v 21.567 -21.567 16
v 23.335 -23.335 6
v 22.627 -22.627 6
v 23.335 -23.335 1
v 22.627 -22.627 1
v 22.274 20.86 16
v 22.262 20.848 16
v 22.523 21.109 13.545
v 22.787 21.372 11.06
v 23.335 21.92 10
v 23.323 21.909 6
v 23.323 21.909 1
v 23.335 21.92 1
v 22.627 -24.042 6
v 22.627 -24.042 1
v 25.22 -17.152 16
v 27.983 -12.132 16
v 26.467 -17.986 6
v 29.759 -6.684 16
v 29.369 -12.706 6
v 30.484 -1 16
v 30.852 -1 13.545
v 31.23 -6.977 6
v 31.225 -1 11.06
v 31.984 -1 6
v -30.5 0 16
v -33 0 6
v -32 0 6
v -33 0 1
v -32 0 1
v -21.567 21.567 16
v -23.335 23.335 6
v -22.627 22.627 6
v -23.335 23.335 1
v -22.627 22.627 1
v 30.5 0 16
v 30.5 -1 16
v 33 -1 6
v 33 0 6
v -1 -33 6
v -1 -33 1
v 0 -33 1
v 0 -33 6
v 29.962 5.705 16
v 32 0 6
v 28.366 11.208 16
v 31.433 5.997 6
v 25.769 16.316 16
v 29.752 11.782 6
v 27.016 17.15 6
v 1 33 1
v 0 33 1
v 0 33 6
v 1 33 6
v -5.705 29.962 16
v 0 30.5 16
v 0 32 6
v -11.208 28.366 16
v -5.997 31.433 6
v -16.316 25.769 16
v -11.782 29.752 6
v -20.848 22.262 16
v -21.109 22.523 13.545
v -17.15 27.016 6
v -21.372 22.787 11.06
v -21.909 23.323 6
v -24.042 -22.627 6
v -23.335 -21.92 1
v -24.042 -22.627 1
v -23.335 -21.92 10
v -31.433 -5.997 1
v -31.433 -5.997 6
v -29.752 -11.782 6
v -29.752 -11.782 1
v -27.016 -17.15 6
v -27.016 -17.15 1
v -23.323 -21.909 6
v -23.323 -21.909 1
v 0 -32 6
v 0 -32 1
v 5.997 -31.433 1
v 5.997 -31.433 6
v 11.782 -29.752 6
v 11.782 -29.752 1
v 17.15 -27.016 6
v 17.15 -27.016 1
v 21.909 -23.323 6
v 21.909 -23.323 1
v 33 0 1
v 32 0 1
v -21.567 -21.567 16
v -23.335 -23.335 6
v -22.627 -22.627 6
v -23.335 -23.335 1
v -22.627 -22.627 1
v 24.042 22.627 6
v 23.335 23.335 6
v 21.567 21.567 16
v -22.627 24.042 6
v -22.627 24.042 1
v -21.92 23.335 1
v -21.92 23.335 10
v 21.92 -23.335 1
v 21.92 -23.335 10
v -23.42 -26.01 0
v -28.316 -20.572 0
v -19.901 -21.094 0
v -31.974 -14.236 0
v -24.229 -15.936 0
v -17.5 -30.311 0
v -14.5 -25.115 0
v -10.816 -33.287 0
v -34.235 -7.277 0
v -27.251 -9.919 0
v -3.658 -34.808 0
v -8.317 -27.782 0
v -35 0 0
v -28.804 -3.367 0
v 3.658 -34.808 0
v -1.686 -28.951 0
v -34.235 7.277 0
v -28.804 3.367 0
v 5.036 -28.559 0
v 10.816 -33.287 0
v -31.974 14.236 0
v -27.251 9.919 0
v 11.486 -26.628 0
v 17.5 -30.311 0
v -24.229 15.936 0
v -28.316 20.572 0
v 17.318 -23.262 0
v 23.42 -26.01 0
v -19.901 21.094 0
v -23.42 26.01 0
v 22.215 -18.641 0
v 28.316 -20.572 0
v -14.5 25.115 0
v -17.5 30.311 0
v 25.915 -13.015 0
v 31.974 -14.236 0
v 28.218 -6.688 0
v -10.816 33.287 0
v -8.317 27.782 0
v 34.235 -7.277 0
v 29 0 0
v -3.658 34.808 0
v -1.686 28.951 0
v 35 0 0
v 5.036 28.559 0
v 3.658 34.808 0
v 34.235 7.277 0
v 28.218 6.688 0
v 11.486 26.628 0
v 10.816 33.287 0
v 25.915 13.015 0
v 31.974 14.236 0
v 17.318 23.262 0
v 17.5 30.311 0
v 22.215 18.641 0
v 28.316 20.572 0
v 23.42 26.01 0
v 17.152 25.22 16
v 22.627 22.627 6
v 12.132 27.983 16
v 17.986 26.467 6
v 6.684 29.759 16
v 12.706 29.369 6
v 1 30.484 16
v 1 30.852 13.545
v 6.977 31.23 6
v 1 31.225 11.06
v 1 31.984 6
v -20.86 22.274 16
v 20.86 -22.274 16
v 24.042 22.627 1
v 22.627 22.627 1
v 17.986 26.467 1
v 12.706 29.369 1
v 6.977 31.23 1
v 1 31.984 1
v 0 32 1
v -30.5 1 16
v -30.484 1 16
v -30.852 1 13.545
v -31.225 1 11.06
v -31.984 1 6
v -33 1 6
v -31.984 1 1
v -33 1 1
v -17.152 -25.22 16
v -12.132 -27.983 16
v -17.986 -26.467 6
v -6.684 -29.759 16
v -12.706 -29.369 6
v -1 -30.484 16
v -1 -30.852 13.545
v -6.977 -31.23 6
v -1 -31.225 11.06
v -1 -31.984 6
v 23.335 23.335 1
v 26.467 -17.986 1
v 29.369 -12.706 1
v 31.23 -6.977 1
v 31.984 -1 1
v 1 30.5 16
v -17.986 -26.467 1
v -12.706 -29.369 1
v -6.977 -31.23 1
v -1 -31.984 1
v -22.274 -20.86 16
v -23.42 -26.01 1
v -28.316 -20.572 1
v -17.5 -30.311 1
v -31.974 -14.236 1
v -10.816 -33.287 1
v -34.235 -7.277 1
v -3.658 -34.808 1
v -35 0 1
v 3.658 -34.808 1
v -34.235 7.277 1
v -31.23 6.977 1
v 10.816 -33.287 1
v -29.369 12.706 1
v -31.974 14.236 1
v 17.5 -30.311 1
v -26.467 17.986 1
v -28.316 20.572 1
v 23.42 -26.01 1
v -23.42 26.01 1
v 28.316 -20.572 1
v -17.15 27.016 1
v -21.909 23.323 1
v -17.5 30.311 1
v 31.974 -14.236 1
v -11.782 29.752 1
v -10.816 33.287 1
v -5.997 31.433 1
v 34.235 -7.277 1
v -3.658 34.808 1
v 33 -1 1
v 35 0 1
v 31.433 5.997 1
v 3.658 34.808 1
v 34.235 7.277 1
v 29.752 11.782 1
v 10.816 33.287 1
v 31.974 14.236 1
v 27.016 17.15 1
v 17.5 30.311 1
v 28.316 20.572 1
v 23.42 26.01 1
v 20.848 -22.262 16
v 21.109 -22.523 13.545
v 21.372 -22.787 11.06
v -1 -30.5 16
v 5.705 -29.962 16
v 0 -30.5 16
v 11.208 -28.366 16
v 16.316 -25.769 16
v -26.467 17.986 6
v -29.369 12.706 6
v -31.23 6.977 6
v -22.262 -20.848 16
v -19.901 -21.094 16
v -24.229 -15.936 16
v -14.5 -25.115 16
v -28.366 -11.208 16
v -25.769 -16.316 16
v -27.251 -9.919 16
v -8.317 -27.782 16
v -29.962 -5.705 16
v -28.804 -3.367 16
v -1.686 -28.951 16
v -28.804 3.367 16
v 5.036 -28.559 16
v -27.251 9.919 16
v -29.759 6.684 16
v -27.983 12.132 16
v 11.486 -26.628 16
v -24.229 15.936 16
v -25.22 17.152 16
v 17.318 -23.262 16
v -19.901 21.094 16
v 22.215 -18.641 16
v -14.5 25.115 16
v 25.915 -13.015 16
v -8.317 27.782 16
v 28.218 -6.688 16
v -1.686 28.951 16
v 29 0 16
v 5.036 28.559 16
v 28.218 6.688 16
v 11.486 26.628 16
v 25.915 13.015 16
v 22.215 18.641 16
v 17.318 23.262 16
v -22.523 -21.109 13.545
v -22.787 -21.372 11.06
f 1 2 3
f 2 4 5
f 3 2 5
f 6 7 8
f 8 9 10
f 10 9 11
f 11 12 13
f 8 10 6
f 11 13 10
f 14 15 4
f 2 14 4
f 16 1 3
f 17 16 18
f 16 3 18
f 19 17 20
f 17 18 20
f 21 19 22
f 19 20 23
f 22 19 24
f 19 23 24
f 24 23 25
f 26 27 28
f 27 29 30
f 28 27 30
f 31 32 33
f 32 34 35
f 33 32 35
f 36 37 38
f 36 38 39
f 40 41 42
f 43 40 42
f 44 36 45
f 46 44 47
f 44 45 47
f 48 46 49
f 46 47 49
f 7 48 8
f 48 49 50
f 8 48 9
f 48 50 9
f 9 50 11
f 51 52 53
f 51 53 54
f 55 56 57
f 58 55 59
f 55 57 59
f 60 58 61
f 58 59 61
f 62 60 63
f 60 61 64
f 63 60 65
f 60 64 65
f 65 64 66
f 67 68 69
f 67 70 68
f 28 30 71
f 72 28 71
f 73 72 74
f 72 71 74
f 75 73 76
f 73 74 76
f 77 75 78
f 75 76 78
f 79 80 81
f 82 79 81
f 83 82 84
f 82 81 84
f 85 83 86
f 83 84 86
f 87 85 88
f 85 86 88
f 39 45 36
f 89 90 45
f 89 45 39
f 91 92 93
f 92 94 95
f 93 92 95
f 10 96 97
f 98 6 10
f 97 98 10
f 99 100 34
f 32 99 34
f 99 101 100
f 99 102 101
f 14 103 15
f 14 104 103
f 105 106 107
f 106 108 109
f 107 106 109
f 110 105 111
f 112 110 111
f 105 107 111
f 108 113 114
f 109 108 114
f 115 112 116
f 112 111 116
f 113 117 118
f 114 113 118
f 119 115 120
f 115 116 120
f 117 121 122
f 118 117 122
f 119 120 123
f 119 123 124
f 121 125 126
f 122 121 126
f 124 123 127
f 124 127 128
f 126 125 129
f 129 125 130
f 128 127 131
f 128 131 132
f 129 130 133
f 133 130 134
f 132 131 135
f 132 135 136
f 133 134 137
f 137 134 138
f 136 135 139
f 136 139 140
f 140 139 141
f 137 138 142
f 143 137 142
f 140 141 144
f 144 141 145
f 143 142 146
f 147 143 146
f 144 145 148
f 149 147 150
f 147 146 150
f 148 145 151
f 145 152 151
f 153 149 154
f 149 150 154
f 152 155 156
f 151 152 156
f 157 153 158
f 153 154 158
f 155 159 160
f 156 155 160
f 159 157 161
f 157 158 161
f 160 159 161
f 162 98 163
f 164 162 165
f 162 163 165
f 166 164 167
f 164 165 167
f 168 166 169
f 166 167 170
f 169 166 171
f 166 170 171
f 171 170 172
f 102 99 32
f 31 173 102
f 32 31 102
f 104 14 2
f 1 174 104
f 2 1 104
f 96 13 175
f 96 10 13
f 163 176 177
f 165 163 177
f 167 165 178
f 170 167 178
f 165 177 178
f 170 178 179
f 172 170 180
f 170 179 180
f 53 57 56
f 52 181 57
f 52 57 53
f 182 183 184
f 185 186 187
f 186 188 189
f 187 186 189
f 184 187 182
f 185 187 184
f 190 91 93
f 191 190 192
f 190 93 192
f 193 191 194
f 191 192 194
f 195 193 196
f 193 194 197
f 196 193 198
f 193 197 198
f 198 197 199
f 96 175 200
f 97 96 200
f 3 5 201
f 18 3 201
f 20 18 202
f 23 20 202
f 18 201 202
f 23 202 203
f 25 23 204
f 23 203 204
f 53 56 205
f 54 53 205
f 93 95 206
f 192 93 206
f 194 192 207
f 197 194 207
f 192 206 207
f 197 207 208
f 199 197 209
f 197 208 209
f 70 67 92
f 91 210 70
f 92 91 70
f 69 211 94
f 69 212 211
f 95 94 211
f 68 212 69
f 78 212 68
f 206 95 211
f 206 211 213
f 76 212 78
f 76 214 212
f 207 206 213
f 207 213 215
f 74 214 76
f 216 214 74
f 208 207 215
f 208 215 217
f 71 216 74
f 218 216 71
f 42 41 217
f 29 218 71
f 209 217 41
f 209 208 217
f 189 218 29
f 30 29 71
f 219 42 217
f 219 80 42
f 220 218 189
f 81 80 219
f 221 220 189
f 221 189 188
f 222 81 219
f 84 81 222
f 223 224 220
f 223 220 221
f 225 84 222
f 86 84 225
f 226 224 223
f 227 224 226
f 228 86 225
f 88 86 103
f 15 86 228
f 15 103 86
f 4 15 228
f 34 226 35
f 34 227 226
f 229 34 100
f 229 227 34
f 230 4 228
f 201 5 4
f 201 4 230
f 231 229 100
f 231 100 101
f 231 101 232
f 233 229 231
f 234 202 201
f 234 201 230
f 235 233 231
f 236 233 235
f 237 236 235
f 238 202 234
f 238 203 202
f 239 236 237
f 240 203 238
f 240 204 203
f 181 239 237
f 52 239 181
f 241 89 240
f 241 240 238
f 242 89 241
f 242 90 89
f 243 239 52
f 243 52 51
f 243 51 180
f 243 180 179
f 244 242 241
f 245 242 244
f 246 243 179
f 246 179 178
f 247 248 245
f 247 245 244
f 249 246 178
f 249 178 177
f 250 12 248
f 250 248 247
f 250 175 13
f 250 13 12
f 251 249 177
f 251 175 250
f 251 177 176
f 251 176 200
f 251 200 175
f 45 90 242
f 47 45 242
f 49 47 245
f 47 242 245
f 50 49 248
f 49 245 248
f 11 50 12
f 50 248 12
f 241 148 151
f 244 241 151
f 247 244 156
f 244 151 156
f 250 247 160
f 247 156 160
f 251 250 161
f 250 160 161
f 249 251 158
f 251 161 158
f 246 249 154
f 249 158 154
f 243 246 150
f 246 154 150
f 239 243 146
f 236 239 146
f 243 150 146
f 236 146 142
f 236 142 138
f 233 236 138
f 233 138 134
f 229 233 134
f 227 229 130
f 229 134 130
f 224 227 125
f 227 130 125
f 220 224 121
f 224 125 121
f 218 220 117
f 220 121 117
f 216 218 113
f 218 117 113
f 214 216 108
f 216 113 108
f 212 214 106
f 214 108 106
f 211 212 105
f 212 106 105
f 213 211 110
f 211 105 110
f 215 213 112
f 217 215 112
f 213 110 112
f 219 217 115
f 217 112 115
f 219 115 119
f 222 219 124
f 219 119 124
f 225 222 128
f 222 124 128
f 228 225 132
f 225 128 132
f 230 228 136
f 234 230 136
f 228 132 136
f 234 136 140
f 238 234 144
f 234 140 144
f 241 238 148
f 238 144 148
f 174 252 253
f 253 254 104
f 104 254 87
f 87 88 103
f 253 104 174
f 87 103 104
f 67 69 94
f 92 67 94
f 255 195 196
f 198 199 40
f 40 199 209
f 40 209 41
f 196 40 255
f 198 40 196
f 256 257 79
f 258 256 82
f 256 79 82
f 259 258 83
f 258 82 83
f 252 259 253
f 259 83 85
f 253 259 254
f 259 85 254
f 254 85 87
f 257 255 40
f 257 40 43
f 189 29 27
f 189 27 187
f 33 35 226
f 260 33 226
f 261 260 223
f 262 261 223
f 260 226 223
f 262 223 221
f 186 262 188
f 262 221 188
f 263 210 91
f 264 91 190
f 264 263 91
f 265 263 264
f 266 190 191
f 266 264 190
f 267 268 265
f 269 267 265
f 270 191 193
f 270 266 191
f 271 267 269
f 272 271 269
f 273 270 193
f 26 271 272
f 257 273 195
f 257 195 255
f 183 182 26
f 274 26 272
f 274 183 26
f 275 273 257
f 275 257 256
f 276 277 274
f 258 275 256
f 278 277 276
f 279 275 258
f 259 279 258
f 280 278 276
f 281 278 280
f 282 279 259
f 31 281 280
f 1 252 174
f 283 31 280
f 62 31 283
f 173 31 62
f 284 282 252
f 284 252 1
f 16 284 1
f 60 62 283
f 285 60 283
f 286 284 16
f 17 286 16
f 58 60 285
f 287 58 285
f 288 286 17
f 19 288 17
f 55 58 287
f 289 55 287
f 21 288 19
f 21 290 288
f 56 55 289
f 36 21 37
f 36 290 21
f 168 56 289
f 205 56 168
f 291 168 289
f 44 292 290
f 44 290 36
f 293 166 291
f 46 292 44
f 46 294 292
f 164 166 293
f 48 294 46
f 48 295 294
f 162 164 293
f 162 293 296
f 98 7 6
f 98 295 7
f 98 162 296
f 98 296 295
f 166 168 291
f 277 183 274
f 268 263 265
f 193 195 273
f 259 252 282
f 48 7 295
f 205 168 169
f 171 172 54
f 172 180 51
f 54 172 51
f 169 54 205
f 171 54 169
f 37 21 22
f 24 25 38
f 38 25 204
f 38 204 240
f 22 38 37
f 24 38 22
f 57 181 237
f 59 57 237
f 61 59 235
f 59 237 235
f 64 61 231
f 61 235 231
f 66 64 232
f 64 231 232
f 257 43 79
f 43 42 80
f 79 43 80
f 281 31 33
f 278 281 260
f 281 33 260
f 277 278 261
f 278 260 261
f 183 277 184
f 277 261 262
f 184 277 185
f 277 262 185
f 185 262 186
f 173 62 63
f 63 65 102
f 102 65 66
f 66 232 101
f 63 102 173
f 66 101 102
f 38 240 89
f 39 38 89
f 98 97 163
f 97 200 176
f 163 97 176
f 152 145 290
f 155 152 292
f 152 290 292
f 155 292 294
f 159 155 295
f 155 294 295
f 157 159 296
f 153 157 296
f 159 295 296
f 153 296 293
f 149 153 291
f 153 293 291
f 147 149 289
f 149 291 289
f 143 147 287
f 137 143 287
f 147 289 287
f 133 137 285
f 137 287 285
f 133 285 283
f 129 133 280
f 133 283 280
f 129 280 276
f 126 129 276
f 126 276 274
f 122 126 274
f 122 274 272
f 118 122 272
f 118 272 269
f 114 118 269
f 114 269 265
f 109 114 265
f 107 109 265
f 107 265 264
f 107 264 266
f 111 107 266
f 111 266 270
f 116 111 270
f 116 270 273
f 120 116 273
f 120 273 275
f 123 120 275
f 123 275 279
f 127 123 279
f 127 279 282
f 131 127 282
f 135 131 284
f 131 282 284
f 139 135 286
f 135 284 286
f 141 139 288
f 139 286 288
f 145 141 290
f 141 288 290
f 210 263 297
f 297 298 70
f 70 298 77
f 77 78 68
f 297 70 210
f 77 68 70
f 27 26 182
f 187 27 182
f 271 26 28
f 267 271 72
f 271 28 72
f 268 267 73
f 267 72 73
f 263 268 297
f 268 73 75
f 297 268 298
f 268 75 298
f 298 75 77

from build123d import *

# Parameters (mm, degrees)
F0_R       = 35
F1_DEPTH   = 1
F2_W       = 1
F2_H       = 1
F3_DEPTH   = 15
F4_R       = 29
F5_DEPTH   = 16.001
F6_SIZE2   = 10
F6_SIZE    = 1.5
F7_SIZE2   = 2.5
F7_SIZE    = 10
F7_2_SIZE2 = 2.5
F7_2_SIZE  = 10
F7_3_SIZE2 = 2.5
F7_3_SIZE  = 10
F7_4_SIZE2 = 2.5
F7_4_SIZE  = 10
F7_5_SIZE2 = 2.5
F7_5_SIZE  = 10
F7_6_SIZE2 = 2.5
F7_6_SIZE  = 10
F7_7_SIZE2 = 2.5
F7_7_SIZE  = 10
F7_8_SIZE2 = 2.5
F7_8_SIZE  = 10


with BuildPart() as f1:
    # F0 (on Top) → F1 (new body)
    with BuildSketch(Plane.XY):
        Circle(F0_R)
    extrude(amount=F1_DEPTH)

    # F2 (on face) → F3 (join)
    with BuildSketch(Plane.XY.offset(1)):
        with BuildLine():
            Line((31, 0), (32, 0))
            ThreePointArc((32, 0), (29.7519001173, 11.7823783426), (23.323472537, 21.9092589746))
            Line((23.323472537, 21.9092589746), (22.627416998, 21.2132034356))
            Line((22.627416998, 21.2132034356), (21.9203102168, 21.9203102168))
            Line((21.9203102168, 21.9203102168), (22.627416998, 22.627416998))
            ThreePointArc((22.627416998, 22.627416998), (12.7063707016, 29.3691699507), (1, 31.9843711834))
            Line((1, 31.9843711834), (1, 31))
            Line((1, 31), (0, 31))
            Line((0, 31), (0, 32))
            ThreePointArc((0, 32), (-11.7823783426, 29.7519001173), (-21.9092589746, 23.323472537))
            Line((-21.9092589746, 23.323472537), (-21.2132034356, 22.627416998))
            Line((-21.2132034356, 22.627416998), (-21.9203102168, 21.9203102168))
            Line((-21.9203102168, 21.9203102168), (-22.627416998, 22.627416998))
            ThreePointArc((-22.627416998, 22.627416998), (-29.3691699507, 12.7063707016), (-31.9843711834, 1))
            Line((-31.9843711834, 1), (-31, 1))
            Line((-31, 1), (-31, 0))
            Line((-31, 0), (-32, 0))
            ThreePointArc((-32, 0), (-29.7519001173, -11.7823783426), (-23.323472537, -21.9092589746))
            Line((-23.323472537, -21.9092589746), (-22.627416998, -21.2132034356))
            Line((-22.627416998, -21.2132034356), (-21.9203102168, -21.9203102168))
            Line((-21.9203102168, -21.9203102168), (-22.627416998, -22.627416998))
            ThreePointArc((-22.627416998, -22.627416998), (-12.7063707016, -29.3691699507), (-1, -31.9843711834))
            Line((-1, -31.9843711834), (-1, -31))
            Line((-1, -31), (0, -31))
            Line((0, -31), (0, -32))
            ThreePointArc((0, -32), (11.7823783426, -29.7519001173), (21.9092589746, -23.323472537))
            Line((21.9092589746, -23.323472537), (21.2132034356, -22.627416998))
            Line((21.2132034356, -22.627416998), (21.9203102168, -21.9203102168))
            Line((21.9203102168, -21.9203102168), (22.627416998, -22.627416998))
            ThreePointArc((22.627416998, -22.627416998), (29.3691699507, -12.7063707016), (31.9843711834, -1))
            Line((31.9843711834, -1), (31, -1))
            Line((31, -1), (31, 0))
        make_face()
        with BuildLine():
            Line((32, -1), (32, 0))
            ThreePointArc((32, 0), (31.9960925573, -0.5000610612), (31.9843711834, -1))
            Line((31.9843711834, -1), (32, -1))
        make_face()
        with BuildLine():
            ThreePointArc((31.9843711834, -1), (31.9960925573, -0.5000610612), (32, 0))
            Line((32, 0), (31, 0))
            Line((31, 0), (31, -1))
            Line((31, -1), (31.9843711834, -1))
        make_face()
        with Locations((32.5, -0.5)):
            Rectangle(F2_W, F2_H)
        with BuildLine():
            Line((22.627416998, 21.2132034356), (23.323472537, 21.9092589746))
            ThreePointArc((23.323472537, 21.9092589746), (22.9782505862, 22.2710574513), (22.627416998, 22.627416998))
            Line((22.627416998, 22.627416998), (21.9203102168, 21.9203102168))
            Line((21.9203102168, 21.9203102168), (22.627416998, 21.2132034356))
        make_face()
        with BuildLine():
            ThreePointArc((22.627416998, 22.627416998), (22.9782505862, 22.2710574513), (23.323472537, 21.9092589746))
            Line((23.323472537, 21.9092589746), (23.3345237792, 21.9203102168))
            Line((23.3345237792, 21.9203102168), (22.627416998, 22.627416998))
        make_face()
        Polygon((23.3345237792, 23.3345237792), (22.627416998, 22.627416998), (23.3345237792, 21.9203102168), (24.0416305603, 22.627416998), align=None)
        with BuildLine():
            Line((21.9203102168, -23.3345237792), (22.627416998, -22.627416998))
            ThreePointArc((22.627416998, -22.627416998), (22.2710574513, -22.9782505862), (21.9092589746, -23.323472537))
            Line((21.9092589746, -23.323472537), (21.9203102168, -23.3345237792))
        make_face()
        with BuildLine():
            ThreePointArc((21.9092589746, -23.323472537), (22.2710574513, -22.9782505862), (22.627416998, -22.627416998))
            Line((22.627416998, -22.627416998), (21.9203102168, -21.9203102168))
            Line((21.9203102168, -21.9203102168), (21.2132034356, -22.627416998))
            Line((21.2132034356, -22.627416998), (21.9092589746, -23.323472537))
        make_face()
        Polygon((23.3345237792, -23.3345237792), (22.627416998, -22.627416998), (21.9203102168, -23.3345237792), (22.627416998, -24.0416305603), align=None)
        with BuildLine():
            Line((1, 31), (1, 31.9843711834))
            ThreePointArc((1, 31.9843711834), (0.5000610612, 31.9960925573), (0, 32))
            Line((0, 32), (0, 31))
            Line((0, 31), (1, 31))
        make_face()
        with BuildLine():
            ThreePointArc((0, 32), (0.5000610612, 31.9960925573), (1, 31.9843711834))
            Line((1, 31.9843711834), (1, 32))
            Line((1, 32), (0, 32))
        make_face()
        with Locations((0.5, 32.5)):
            Rectangle(F2_W, F2_H)
        with BuildLine():
            Line((-1, -32), (0, -32))
            ThreePointArc((0, -32), (-0.5000610612, -31.9960925573), (-1, -31.9843711834))
            Line((-1, -31.9843711834), (-1, -32))
        make_face()
        with BuildLine():
            ThreePointArc((-1, -31.9843711834), (-0.5000610612, -31.9960925573), (0, -32))
            Line((0, -32), (0, -31))
            Line((0, -31), (-1, -31))
            Line((-1, -31), (-1, -31.9843711834))
        make_face()
        with Locations((-0.5, -32.5)):
            Rectangle(F2_W, F2_H)
        with BuildLine():
            Line((-21.2132034356, 22.627416998), (-21.9092589746, 23.323472537))
            ThreePointArc((-21.9092589746, 23.323472537), (-22.2710574513, 22.9782505862), (-22.627416998, 22.627416998))
            Line((-22.627416998, 22.627416998), (-21.9203102168, 21.9203102168))
            Line((-21.9203102168, 21.9203102168), (-21.2132034356, 22.627416998))
        make_face()
        with BuildLine():
            ThreePointArc((-22.627416998, 22.627416998), (-22.2710574513, 22.9782505862), (-21.9092589746, 23.323472537))
            Line((-21.9092589746, 23.323472537), (-21.9203102168, 23.3345237792))
            Line((-21.9203102168, 23.3345237792), (-22.627416998, 22.627416998))
        make_face()
        Polygon((-23.3345237792, 23.3345237792), (-22.627416998, 22.627416998), (-21.9203102168, 23.3345237792), (-22.627416998, 24.0416305603), align=None)
        with BuildLine():
            Line((-23.3345237792, -21.9203102168), (-22.627416998, -22.627416998))
            ThreePointArc((-22.627416998, -22.627416998), (-22.9782505862, -22.2710574513), (-23.323472537, -21.9092589746))
            Line((-23.323472537, -21.9092589746), (-23.3345237792, -21.9203102168))
        make_face()
        with BuildLine():
            ThreePointArc((-23.323472537, -21.9092589746), (-22.9782505862, -22.2710574513), (-22.627416998, -22.627416998))
            Line((-22.627416998, -22.627416998), (-21.9203102168, -21.9203102168))
            Line((-21.9203102168, -21.9203102168), (-22.627416998, -21.2132034356))
            Line((-22.627416998, -21.2132034356), (-23.323472537, -21.9092589746))
        make_face()
        Polygon((-23.3345237792, -23.3345237792), (-22.627416998, -22.627416998), (-23.3345237792, -21.9203102168), (-24.0416305603, -22.627416998), align=None)
        with BuildLine():
            Line((-31, 1), (-31.9843711834, 1))
            ThreePointArc((-31.9843711834, 1), (-31.9960925573, 0.5000610612), (-32, 0))
            Line((-32, 0), (-31, 0))
            Line((-31, 0), (-31, 1))
        make_face()
        with BuildLine():
            ThreePointArc((-32, 0), (-31.9960925573, 0.5000610612), (-31.9843711834, 1))
            Line((-31.9843711834, 1), (-32, 1))
            Line((-32, 1), (-32, 0))
        make_face()
        with Locations((-32.5, 0.5)):
            Rectangle(F2_W, F2_H)
    extrude(amount=F3_DEPTH)

    # F4 (on face) → F5 (cut, through all)
    with BuildSketch(Plane.XY.offset(16)):
        Circle(F4_R)
    extrude(amount=-F5_DEPTH, mode=Mode.SUBTRACT)

    # F6
    f6_edges = [f1.edges().sort_by_distance(p)[0] for p in [
        (12.706371, 29.36917, 16),
        (29.7519, 11.782378, 16),
        (29.36917, -12.706371, 16),
        (11.782378, -29.7519, 16),
        (-12.706371, -29.36917, 16),
        (-29.7519, -11.782378, 16),
        (-29.36917, 12.706371, 16),
        (-11.782378, 29.7519, 16),
    ]]
    f6_side = f1.faces().sort_by_distance((28.512525, -12.335749, 16))[0]
    chamfer(f6_edges, length=F6_SIZE, length2=F6_SIZE2, reference=f6_side)

    # F7
    f7_edges = [f1.edges().sort_by_distance(p)[0] for p in [
        (33, -0.5, 16),
    ]]
    f7_side = f1.faces().sort_by_distance((33, -0.5, 8.5))[0]
    chamfer(f7_edges, length=F7_SIZE, length2=F7_SIZE2, reference=f7_side)

    # F7#2
    f7_2_edges = [f1.edges().sort_by_distance(p)[0] for p in [
        (22.98097, -23.688077, 16),
    ]]
    f7_2_side = f1.faces().sort_by_distance((22.98097, -23.688077, 8.5))[0]
    chamfer(f7_2_edges, length=F7_2_SIZE, length2=F7_2_SIZE2, reference=f7_2_side)

    # F7#3
    f7_3_edges = [f1.edges().sort_by_distance(p)[0] for p in [
        (-0.5, -33, 16),
    ]]
    f7_3_side = f1.faces().sort_by_distance((-0.5, -33, 8.5))[0]
    chamfer(f7_3_edges, length=F7_3_SIZE, length2=F7_3_SIZE2, reference=f7_3_side)

    # F7#4
    f7_4_edges = [f1.edges().sort_by_distance(p)[0] for p in [
        (-23.688077, -22.98097, 16),
    ]]
    f7_4_side = f1.faces().sort_by_distance((-23.688077, -22.98097, 8.5))[0]
    chamfer(f7_4_edges, length=F7_4_SIZE, length2=F7_4_SIZE2, reference=f7_4_side)

    # F7#5
    f7_5_edges = [f1.edges().sort_by_distance(p)[0] for p in [
        (-33, 0.5, 16),
    ]]
    f7_5_side = f1.faces().sort_by_distance((-33, 0.5, 8.5))[0]
    chamfer(f7_5_edges, length=F7_5_SIZE, length2=F7_5_SIZE2, reference=f7_5_side)

    # F7#6
    f7_6_edges = [f1.edges().sort_by_distance(p)[0] for p in [
        (-22.98097, 23.688077, 16),
    ]]
    f7_6_side = f1.faces().sort_by_distance((-22.98097, 23.688077, 8.5))[0]
    chamfer(f7_6_edges, length=F7_6_SIZE, length2=F7_6_SIZE2, reference=f7_6_side)

    # F7#7
    f7_7_edges = [f1.edges().sort_by_distance(p)[0] for p in [
        (0.5, 33, 16),
    ]]
    f7_7_side = f1.faces().sort_by_distance((0.5, 33, 8.5))[0]
    chamfer(f7_7_edges, length=F7_7_SIZE, length2=F7_7_SIZE2, reference=f7_7_side)

    # F7#8
    f7_8_edges = [f1.edges().sort_by_distance(p)[0] for p in [
        (23.688077, 22.98097, 16),
    ]]
    f7_8_side = f1.faces().sort_by_distance((23.688077, 22.98097, 8.5))[0]
    chamfer(f7_8_edges, length=F7_8_SIZE, length2=F7_8_SIZE2, reference=f7_8_side)


solid = f1.part
